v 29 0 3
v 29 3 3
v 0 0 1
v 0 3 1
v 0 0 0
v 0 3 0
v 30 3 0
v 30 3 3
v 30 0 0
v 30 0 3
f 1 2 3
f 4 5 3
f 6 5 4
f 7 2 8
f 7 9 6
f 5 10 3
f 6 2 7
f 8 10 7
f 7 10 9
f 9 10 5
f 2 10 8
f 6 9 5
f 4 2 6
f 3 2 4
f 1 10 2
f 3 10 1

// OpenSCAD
// Need something to wedge between parts.  This is a small model that meets that need..


min_z=1;
max_z=3;
x=30;
y=3;


hull()
{
    cube([1,y,min_z]);

    translate([x-1,0,0])
    cube([1,y,max_z]);
}
